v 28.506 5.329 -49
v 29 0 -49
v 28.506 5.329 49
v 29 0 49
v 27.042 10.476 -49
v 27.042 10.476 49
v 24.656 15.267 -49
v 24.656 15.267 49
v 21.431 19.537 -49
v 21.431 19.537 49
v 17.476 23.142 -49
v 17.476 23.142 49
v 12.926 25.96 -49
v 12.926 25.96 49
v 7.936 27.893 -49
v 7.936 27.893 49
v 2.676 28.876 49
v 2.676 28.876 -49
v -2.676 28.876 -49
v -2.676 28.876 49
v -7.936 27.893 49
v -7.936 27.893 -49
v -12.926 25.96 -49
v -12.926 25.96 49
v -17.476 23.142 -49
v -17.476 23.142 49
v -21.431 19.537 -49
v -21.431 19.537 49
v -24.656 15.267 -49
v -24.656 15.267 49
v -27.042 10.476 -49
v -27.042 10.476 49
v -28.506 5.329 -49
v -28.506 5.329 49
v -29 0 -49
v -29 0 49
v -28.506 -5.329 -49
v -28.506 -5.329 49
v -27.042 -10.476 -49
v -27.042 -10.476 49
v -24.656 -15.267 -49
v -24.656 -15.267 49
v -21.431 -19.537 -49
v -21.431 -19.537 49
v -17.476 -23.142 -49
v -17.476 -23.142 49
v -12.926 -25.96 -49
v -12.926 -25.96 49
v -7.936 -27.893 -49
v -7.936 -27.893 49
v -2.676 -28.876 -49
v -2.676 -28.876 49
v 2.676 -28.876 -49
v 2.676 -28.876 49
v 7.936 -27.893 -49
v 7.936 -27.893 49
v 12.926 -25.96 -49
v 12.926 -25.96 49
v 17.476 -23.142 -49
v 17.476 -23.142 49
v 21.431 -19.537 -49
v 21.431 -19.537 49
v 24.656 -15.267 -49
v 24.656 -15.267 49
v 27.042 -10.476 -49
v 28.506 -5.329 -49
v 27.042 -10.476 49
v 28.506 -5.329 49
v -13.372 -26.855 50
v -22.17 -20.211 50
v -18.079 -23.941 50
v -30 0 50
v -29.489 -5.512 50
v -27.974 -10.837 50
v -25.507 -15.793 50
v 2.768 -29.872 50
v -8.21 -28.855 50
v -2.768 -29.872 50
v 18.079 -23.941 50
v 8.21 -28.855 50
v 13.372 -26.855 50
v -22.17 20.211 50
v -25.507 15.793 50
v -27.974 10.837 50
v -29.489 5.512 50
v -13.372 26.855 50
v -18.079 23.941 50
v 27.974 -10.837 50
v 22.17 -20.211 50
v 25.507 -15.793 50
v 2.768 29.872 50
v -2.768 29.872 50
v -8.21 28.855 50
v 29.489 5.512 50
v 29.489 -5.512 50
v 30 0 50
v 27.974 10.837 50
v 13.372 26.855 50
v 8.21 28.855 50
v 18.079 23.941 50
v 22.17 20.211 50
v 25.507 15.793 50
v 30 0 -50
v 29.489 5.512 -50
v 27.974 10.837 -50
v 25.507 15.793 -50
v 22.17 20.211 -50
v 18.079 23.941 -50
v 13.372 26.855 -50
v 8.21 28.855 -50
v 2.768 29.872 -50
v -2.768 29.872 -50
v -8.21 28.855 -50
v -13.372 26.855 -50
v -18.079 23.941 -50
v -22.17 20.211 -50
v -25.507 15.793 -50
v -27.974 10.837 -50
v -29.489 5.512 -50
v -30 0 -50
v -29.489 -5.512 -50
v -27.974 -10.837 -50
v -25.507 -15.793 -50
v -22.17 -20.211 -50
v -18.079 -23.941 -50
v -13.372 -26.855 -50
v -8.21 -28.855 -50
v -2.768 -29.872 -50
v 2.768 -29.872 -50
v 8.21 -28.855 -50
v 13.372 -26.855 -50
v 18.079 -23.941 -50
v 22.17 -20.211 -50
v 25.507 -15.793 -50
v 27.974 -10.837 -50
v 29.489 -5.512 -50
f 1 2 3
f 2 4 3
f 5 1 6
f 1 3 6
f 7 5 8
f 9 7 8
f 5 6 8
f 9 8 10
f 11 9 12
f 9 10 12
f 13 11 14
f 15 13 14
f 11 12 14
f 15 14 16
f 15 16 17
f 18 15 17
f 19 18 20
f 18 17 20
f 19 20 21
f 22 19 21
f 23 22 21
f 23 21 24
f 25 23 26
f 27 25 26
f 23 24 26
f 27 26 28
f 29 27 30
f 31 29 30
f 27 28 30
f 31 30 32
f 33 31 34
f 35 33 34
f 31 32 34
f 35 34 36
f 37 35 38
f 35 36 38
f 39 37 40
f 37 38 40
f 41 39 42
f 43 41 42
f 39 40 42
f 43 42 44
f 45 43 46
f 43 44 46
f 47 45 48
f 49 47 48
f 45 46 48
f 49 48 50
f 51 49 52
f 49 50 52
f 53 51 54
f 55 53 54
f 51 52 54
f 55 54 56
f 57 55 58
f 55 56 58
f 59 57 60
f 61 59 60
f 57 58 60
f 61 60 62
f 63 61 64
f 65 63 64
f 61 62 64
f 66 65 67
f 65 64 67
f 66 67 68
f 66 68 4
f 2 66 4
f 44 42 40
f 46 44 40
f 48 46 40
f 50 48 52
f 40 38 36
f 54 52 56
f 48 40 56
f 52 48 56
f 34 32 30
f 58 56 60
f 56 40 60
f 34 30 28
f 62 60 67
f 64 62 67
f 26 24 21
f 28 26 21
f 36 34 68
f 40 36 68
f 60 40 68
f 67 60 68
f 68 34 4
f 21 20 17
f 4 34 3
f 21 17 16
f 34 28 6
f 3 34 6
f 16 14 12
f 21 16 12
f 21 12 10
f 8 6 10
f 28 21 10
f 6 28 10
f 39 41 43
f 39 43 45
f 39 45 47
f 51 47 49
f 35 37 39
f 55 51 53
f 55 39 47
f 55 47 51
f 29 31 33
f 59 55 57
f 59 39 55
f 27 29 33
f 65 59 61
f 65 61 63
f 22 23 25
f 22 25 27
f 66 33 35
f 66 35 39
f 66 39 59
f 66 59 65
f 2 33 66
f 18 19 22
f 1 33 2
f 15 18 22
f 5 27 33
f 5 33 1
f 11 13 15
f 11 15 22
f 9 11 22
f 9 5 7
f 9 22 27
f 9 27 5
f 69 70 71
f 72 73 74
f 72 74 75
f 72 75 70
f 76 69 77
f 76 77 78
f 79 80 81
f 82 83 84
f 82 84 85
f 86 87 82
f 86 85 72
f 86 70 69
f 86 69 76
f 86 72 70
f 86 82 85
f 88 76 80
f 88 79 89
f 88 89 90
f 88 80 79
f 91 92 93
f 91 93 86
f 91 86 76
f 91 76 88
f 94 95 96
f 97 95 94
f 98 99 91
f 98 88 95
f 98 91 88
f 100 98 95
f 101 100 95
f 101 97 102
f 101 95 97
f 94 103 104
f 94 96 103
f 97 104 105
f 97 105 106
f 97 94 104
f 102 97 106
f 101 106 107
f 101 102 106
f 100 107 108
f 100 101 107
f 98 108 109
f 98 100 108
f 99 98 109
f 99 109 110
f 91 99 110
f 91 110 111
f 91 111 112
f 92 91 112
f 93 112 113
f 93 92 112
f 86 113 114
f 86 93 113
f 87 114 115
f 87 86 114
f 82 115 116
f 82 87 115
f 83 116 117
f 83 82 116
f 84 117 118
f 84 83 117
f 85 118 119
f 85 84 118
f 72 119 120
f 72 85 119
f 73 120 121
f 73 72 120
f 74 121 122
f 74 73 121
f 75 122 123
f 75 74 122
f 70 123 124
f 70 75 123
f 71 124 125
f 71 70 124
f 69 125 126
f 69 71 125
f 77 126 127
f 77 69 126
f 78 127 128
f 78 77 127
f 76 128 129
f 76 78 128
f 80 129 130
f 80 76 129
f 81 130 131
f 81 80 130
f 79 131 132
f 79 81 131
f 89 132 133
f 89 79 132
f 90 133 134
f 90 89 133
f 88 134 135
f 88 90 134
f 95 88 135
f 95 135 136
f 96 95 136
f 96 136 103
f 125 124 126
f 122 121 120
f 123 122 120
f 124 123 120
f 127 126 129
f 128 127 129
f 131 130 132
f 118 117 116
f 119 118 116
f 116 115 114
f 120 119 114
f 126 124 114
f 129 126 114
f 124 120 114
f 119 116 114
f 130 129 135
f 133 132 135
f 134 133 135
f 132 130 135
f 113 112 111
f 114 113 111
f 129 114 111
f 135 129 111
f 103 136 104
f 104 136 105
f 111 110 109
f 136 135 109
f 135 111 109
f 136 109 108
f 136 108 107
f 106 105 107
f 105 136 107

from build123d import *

# Parameters (mm, degrees)
F0_R     = 30
F1_DEPTH = 50
F2_R     = 29
F3_DEPTH = 49


with BuildPart() as f1:
    # F0 (on Top) → F1 (new body, symmetric)
    with BuildSketch(Plane.XY):
        Circle(F0_R)
    extrude(amount=F1_DEPTH, both=True)


with BuildPart() as f3:
    # F2 (on Top) → F3 (new body, symmetric)
    with BuildSketch(Plane.XY):
        Circle(F2_R)
    extrude(amount=F3_DEPTH, both=True)


with BuildPart() as f1_1:
    add(f1.part)

    # F4: cut F3
    add(f3.part, mode=Mode.SUBTRACT)


solid = f1_1.part
